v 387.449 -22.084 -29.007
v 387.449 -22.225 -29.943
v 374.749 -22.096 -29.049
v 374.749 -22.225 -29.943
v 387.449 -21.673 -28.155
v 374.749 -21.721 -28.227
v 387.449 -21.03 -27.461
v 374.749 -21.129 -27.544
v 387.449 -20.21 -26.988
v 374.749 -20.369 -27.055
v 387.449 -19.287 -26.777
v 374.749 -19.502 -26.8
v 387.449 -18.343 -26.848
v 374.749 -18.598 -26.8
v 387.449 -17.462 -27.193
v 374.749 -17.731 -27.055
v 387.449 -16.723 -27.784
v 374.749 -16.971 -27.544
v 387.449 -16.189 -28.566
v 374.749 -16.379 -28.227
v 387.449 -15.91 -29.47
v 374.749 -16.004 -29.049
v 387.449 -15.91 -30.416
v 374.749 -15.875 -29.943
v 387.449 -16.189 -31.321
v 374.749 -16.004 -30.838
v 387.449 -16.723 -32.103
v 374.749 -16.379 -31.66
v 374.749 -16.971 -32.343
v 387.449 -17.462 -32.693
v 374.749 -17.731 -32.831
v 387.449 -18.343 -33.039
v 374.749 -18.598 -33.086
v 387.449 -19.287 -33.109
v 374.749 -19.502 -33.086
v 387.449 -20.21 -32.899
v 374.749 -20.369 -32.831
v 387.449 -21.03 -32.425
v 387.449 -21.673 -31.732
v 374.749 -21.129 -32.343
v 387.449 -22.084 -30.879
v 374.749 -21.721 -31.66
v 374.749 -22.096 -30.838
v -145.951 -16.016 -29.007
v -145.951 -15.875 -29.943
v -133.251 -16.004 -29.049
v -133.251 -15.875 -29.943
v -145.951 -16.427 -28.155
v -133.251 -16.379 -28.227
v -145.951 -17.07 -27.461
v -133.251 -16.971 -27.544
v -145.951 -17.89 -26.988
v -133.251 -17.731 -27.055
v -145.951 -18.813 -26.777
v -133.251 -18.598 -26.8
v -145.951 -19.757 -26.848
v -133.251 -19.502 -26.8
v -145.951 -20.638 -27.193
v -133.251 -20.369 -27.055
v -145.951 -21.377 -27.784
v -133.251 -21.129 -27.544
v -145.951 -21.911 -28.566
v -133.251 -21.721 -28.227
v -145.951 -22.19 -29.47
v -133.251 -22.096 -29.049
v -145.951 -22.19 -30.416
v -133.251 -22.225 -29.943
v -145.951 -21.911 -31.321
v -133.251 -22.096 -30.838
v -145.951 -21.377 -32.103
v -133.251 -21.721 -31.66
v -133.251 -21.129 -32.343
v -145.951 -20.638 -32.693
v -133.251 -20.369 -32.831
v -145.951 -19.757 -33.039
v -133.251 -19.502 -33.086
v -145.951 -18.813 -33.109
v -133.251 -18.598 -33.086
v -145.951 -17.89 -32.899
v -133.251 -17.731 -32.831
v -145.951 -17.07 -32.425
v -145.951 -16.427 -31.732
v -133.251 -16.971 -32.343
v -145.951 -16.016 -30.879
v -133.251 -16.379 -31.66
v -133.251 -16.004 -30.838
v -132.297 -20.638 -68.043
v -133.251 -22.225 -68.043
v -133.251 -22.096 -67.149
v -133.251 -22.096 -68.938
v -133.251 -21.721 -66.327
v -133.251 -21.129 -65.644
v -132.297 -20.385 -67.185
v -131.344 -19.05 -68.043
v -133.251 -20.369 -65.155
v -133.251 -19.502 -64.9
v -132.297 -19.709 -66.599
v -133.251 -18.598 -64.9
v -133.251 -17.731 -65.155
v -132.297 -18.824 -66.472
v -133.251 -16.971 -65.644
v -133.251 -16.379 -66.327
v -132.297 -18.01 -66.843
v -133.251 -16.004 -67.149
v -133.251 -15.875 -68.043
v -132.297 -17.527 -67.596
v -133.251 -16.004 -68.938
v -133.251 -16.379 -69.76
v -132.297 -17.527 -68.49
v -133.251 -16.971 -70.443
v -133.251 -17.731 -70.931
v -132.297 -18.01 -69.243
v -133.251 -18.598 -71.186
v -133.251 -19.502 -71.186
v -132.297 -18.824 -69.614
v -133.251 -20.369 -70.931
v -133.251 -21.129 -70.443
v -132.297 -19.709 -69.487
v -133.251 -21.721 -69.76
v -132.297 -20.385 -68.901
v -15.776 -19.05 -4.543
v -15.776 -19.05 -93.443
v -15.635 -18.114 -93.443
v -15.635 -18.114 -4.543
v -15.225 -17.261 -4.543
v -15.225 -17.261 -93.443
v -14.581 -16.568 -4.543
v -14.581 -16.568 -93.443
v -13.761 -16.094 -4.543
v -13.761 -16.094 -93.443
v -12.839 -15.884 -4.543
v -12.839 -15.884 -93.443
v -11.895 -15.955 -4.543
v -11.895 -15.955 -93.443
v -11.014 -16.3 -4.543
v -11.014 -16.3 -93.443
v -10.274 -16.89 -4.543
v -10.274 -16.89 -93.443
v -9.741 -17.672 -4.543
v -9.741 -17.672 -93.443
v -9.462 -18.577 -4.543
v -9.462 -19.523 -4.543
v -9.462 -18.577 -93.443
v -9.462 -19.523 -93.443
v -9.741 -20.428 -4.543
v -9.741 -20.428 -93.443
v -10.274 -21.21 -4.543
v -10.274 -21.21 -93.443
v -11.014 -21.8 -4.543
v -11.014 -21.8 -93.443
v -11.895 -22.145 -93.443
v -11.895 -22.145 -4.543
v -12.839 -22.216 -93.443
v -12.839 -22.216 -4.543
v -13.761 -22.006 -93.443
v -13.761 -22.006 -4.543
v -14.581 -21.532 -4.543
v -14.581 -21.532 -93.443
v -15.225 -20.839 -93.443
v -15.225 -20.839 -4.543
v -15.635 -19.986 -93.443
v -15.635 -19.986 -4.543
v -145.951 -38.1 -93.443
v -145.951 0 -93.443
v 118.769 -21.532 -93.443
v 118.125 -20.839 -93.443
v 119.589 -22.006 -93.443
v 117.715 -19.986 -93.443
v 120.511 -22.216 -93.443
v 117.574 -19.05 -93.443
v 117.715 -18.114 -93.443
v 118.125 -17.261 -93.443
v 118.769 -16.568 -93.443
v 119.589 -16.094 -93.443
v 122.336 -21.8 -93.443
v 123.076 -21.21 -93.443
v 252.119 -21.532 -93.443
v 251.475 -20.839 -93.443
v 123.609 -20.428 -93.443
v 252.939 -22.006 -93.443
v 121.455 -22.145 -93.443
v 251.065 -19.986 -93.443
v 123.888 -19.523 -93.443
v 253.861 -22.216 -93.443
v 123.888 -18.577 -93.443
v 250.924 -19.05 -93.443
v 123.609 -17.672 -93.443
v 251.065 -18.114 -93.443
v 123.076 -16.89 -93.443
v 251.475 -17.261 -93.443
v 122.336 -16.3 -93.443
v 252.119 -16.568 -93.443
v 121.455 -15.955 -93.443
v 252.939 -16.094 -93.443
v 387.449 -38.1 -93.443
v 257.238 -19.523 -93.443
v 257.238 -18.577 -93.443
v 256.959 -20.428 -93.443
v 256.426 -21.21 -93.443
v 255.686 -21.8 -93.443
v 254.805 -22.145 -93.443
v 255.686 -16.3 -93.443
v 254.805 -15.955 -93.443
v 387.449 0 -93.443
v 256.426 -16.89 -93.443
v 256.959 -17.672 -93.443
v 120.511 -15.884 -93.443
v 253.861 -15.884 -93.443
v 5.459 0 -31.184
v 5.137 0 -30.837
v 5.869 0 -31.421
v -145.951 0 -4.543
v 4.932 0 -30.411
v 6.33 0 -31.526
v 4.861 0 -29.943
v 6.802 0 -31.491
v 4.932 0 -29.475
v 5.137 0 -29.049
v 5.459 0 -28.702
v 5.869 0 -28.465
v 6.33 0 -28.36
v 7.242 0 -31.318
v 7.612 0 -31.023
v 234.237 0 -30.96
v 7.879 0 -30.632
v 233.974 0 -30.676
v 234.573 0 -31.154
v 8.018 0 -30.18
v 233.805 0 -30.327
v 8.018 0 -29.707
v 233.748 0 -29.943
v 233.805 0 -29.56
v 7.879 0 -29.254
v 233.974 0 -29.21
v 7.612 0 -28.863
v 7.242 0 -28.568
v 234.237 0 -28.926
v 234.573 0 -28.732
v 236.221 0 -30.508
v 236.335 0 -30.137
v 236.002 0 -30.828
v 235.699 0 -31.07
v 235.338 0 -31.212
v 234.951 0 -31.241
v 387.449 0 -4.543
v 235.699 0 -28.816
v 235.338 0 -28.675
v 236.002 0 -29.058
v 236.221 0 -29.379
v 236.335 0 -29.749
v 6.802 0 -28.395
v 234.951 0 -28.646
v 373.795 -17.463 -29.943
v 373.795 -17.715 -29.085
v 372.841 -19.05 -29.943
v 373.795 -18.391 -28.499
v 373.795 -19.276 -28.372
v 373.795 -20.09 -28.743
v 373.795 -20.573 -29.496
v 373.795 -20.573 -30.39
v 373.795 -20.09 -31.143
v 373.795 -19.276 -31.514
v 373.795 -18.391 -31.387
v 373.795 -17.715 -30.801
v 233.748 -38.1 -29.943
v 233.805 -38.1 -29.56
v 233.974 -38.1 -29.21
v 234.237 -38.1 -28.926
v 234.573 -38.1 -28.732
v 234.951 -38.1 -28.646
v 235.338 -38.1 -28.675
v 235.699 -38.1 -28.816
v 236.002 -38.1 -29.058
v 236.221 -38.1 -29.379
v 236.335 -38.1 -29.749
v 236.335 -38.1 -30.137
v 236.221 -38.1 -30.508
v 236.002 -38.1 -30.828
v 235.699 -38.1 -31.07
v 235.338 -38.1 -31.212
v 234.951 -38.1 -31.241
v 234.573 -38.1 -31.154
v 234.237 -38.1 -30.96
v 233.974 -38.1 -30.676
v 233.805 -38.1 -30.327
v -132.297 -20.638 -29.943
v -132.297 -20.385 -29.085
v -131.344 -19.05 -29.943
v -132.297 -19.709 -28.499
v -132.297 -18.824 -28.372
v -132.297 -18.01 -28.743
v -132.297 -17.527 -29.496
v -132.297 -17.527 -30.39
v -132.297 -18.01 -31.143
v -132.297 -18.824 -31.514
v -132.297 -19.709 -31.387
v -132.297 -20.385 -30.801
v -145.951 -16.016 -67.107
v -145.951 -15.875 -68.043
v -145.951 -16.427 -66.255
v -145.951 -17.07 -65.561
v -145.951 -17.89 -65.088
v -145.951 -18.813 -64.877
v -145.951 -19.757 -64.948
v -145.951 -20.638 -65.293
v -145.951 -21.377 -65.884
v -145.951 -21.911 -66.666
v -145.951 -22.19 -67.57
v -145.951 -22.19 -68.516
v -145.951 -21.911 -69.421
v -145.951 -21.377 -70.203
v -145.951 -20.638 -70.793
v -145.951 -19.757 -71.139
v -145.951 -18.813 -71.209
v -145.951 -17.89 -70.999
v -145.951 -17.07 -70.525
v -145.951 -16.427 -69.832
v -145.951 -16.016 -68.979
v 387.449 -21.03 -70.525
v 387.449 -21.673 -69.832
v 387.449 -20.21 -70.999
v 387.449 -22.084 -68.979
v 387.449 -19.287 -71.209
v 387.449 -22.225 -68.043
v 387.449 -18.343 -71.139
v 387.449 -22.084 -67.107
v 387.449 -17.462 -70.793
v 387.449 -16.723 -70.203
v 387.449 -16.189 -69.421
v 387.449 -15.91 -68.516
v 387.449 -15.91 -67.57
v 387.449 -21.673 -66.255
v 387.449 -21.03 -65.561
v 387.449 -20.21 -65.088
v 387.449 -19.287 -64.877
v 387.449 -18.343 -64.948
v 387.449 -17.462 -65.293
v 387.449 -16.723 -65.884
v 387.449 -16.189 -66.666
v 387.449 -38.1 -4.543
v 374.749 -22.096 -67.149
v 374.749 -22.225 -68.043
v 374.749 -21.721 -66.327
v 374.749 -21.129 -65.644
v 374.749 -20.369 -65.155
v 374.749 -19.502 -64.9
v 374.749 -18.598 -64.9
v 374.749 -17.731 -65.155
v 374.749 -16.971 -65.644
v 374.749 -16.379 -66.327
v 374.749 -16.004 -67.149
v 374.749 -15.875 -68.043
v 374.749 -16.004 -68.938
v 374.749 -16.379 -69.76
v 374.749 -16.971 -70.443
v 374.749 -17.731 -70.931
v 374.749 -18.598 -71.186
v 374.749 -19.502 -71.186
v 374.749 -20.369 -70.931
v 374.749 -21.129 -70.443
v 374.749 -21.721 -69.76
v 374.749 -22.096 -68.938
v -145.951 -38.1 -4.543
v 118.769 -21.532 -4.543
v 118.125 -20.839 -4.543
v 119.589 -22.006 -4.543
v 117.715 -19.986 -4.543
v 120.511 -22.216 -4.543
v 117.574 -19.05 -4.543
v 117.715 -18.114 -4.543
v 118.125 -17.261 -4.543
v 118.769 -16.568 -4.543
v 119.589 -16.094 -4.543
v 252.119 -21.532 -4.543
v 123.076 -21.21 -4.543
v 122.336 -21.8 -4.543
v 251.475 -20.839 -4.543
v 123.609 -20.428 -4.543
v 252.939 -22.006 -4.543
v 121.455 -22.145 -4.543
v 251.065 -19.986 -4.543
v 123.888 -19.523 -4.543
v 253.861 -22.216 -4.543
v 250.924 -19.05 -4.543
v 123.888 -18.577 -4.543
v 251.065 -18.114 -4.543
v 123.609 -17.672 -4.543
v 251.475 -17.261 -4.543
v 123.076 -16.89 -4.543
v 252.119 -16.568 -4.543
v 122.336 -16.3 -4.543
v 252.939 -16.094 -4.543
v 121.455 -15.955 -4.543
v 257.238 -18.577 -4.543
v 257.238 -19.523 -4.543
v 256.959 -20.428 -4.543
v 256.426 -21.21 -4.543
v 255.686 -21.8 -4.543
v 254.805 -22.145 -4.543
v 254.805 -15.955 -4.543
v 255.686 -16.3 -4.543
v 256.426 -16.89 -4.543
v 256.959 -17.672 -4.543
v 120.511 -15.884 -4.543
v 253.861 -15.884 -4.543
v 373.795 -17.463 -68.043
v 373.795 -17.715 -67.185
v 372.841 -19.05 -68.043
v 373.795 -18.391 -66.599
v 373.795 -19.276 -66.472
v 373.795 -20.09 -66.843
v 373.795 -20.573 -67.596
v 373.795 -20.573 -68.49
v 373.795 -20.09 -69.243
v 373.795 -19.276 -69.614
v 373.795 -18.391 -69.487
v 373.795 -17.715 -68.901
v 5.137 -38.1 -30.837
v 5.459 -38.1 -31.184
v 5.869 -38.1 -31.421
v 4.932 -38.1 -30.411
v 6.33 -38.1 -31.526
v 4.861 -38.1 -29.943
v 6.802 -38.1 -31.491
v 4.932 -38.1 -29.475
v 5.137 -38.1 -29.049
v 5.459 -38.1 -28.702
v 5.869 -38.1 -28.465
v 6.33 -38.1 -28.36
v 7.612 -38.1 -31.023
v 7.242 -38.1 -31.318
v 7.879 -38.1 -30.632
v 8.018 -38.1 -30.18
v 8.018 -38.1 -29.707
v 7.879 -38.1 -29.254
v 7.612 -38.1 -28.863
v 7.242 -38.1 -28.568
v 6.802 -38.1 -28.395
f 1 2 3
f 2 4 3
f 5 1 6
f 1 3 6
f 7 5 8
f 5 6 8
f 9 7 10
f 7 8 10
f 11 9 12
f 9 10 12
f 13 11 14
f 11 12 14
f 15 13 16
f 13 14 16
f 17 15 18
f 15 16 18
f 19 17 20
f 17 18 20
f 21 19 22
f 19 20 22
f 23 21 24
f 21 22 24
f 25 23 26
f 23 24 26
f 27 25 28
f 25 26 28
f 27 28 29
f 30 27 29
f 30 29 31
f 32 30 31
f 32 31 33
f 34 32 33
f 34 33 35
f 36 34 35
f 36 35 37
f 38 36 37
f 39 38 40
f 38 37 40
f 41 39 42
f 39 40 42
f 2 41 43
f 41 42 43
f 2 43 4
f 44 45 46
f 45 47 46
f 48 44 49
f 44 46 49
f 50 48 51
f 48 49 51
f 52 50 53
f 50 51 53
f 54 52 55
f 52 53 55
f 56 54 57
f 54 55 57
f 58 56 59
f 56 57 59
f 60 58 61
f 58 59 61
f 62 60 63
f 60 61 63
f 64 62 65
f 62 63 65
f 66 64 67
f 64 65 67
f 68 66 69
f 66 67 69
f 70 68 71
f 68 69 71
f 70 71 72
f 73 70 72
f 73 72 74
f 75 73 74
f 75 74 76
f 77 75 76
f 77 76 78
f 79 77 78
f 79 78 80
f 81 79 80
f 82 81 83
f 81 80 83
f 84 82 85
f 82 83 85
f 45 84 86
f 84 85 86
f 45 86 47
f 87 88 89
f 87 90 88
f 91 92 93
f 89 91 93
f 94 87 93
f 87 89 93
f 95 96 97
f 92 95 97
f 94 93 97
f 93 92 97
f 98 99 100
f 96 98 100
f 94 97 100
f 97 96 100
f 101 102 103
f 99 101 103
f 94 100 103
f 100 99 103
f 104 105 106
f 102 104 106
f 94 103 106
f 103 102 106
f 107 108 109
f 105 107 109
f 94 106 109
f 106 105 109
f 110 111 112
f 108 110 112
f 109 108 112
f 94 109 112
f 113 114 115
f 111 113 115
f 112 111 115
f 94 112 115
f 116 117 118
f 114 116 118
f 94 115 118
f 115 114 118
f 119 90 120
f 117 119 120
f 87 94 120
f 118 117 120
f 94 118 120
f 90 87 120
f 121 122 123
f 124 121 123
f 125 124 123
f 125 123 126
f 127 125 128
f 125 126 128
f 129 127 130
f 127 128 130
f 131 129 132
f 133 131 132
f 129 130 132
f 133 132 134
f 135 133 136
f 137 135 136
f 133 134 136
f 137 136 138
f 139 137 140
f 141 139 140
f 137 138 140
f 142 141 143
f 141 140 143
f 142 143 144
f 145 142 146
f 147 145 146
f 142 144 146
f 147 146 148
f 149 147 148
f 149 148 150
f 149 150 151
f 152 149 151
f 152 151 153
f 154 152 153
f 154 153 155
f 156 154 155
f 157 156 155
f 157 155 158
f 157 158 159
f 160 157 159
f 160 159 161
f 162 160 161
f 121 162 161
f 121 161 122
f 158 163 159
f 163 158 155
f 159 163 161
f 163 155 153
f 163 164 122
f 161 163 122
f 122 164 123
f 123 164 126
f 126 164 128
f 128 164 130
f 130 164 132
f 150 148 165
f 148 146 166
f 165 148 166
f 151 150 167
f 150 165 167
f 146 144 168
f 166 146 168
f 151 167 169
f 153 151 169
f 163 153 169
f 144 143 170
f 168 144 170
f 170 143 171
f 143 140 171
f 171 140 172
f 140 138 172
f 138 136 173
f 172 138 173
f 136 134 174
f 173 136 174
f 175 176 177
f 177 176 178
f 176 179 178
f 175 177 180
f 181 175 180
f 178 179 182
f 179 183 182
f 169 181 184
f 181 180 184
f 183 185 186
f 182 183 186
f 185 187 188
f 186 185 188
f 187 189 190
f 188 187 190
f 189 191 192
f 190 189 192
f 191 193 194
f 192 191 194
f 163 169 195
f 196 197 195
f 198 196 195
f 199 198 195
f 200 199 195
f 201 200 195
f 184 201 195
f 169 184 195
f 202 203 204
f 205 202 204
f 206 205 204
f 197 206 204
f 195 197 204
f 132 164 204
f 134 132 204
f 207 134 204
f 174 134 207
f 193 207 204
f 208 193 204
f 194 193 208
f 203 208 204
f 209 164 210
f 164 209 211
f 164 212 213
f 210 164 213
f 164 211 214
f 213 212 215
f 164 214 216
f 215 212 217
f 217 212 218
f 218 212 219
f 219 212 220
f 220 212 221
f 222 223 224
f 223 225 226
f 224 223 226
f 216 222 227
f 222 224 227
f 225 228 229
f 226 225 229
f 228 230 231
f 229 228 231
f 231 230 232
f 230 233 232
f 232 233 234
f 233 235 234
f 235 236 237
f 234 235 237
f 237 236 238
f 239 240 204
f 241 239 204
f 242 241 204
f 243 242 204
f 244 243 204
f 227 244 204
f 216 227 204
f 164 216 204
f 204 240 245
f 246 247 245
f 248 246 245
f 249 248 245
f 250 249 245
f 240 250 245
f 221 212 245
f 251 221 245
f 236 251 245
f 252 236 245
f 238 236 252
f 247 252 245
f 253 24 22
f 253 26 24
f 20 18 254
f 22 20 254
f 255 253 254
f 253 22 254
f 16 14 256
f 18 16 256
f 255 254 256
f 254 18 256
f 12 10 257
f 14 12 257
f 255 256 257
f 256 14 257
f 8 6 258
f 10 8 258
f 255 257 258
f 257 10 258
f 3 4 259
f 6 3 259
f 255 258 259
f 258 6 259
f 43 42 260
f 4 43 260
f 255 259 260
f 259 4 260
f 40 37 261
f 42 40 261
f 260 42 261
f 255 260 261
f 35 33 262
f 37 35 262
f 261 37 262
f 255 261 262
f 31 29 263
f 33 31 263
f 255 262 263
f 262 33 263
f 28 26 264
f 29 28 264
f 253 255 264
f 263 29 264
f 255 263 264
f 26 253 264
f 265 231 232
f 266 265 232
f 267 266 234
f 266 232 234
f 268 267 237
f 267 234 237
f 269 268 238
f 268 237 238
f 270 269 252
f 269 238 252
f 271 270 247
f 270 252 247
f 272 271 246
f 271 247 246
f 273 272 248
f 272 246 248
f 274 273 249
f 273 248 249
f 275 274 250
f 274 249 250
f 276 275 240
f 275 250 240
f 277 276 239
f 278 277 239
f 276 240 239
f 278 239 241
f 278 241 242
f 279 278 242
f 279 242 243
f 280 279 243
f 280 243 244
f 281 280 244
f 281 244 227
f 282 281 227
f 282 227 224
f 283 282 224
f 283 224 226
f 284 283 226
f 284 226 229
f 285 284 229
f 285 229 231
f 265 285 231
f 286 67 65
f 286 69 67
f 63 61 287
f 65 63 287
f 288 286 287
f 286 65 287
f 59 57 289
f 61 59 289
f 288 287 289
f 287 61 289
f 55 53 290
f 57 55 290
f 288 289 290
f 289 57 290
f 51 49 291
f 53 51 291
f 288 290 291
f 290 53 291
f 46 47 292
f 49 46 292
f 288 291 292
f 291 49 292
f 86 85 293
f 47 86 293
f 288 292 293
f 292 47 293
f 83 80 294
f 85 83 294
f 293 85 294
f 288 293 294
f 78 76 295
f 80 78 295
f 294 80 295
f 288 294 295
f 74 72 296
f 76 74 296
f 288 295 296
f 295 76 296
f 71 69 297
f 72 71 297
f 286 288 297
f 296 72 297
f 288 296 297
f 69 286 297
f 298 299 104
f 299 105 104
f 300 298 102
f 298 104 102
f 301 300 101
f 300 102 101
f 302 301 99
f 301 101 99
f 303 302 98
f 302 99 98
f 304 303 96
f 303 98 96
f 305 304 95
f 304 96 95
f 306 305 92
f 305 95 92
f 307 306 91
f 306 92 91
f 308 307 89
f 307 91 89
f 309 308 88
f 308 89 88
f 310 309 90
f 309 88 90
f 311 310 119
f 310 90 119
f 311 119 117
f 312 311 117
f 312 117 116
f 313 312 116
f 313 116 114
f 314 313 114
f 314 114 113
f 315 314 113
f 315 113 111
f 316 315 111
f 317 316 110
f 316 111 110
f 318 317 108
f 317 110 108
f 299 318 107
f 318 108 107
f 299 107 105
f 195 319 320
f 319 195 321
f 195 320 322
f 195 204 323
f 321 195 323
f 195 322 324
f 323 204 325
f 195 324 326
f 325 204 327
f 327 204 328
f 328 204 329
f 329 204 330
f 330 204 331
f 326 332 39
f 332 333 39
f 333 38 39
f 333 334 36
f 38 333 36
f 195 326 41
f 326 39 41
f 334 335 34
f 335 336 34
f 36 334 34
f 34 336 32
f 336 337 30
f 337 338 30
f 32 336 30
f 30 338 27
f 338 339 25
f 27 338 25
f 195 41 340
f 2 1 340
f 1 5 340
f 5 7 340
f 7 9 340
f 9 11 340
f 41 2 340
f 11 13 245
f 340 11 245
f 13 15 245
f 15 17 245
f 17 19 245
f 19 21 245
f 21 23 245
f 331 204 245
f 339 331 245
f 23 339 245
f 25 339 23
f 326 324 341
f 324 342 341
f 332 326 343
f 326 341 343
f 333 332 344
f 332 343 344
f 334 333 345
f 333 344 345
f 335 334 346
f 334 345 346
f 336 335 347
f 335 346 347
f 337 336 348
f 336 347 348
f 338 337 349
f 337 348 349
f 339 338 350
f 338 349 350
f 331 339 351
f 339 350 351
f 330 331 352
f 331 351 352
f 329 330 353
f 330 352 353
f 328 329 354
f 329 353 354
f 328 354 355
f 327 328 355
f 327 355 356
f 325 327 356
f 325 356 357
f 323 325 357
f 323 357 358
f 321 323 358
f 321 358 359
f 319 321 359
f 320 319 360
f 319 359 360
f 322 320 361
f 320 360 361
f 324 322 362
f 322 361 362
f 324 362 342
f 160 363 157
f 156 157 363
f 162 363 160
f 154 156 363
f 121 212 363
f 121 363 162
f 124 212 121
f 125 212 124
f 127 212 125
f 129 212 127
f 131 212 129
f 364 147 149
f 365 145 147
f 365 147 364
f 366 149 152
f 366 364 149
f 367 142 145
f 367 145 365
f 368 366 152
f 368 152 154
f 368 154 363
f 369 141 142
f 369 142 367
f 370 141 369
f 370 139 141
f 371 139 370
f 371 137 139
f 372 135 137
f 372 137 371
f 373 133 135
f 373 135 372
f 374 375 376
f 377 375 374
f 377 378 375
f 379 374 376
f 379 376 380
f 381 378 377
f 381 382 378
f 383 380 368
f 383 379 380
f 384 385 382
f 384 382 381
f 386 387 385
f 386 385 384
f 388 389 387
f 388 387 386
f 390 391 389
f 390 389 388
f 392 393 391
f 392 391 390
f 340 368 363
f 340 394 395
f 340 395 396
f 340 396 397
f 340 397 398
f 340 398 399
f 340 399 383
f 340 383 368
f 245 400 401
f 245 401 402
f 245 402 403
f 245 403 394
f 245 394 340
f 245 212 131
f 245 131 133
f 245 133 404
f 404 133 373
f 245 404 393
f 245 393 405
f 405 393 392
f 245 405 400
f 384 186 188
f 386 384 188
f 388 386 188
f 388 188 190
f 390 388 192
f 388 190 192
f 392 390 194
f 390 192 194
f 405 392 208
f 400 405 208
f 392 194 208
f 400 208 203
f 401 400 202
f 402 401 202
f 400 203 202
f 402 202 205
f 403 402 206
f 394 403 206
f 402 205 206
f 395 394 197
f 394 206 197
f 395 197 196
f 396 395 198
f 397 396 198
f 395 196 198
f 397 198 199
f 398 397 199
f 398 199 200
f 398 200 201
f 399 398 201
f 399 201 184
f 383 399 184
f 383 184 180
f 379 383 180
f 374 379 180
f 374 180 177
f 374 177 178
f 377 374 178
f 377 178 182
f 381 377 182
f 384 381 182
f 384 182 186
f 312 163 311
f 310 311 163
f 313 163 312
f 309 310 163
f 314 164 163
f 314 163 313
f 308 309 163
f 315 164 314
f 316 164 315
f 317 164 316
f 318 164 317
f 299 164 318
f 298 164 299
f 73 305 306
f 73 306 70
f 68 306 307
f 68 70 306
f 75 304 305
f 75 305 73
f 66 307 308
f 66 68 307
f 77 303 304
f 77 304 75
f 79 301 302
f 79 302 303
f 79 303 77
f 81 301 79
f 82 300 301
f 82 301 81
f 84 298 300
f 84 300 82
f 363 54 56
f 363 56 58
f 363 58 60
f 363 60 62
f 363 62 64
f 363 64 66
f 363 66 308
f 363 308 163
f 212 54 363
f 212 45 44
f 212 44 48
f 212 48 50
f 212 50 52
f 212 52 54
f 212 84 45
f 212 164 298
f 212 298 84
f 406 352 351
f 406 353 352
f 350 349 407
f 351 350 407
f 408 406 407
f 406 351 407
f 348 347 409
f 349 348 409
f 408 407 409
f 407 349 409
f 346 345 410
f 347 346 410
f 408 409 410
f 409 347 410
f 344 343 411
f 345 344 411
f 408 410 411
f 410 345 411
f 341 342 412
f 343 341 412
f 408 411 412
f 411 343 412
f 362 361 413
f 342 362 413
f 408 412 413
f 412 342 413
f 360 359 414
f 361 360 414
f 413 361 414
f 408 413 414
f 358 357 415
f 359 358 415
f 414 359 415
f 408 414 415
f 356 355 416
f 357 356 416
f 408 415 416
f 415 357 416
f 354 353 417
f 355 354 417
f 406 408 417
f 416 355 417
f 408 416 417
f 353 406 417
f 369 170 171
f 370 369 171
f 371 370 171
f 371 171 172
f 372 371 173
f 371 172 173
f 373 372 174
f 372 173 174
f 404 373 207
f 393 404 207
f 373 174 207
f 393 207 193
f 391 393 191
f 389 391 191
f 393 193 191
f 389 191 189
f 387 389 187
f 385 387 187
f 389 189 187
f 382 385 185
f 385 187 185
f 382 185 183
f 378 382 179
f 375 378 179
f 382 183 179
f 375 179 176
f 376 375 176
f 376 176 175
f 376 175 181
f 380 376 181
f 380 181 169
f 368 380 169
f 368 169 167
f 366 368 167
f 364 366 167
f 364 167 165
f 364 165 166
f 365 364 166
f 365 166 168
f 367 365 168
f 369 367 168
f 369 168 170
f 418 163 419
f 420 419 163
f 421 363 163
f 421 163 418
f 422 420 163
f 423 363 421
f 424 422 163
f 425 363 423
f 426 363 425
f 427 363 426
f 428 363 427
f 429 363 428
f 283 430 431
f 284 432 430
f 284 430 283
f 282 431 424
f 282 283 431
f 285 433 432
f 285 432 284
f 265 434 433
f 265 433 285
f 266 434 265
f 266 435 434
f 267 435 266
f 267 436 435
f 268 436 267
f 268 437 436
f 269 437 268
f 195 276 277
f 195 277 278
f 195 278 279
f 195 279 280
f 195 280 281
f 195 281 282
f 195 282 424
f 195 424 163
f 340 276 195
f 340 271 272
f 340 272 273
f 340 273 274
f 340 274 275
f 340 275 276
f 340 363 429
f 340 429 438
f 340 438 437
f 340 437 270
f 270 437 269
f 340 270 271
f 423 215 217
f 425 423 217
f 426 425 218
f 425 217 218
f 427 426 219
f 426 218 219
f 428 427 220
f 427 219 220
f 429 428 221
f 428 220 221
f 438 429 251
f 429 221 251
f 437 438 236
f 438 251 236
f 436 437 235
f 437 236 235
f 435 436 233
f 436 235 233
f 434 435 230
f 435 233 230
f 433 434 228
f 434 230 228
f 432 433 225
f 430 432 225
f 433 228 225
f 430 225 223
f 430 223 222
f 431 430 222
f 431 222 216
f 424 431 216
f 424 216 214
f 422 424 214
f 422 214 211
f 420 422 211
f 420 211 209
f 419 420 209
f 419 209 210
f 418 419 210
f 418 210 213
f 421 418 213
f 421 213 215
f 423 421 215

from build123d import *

# Parameters (mm, degrees)
F0_W     = 533.4
F0_H     = 88.9
F1_DEPTH = 38.1
F3_D     = 6.35
F3_DEPTH = 12.7
F3_TIP   = 1.9077324654
F5_D     = 6.35
F5_DEPTH = 12.7
F5_TIP   = 1.9077324654
F7_D     = 6.35
F8_R     = 1.3011245906
F8_R_2   = 1.5875
F9_DEPTH = 38.101


with BuildPart() as f1:
    # F0 (on Front) → F1 (new body)
    with BuildSketch(Plane.XZ):
        with Locations((120.748703318, -48.9931209013)):
            Rectangle(F0_W, F0_H)
    extrude(amount=F1_DEPTH)

    # F3
    with Locations(Plane.YZ.offset(387.448703318)):
        with Locations((-19.05, -29.9431209013), (-19.05, -68.0431209013)):
            Hole(F3_D / 2, depth=F3_DEPTH)
            with Locations((0, 0, -(F3_DEPTH + F3_TIP / 2))):  # 118° drill point
                Cone(0, F3_D / 2, F3_TIP, mode=Mode.SUBTRACT)

    # F5
    with Locations(Plane(origin=(-145.951296682, 0, 0), x_dir=(0, -1, 0), z_dir=(-1, 0, 0))):
        with Locations((19.05, -29.9431209013), (19.05, -68.0431209013)):
            Hole(F5_D / 2, depth=F5_DEPTH)
            with Locations((0, 0, -(F5_DEPTH + F5_TIP / 2))):  # 118° drill point
                Cone(0, F5_D / 2, F5_TIP, mode=Mode.SUBTRACT)

    # F7 (through all)
    with Locations(Plane.XY.offset(-4.5431209013)):
        with Locations((-12.601296682, -19.05), (120.748703318, -19.05), (254.098703318, -19.05)):
            Hole(F7_D / 2)

    # F8 (on face) → F9 (cut, through all)
    with BuildSketch(Plane(origin=(0, 0, 0), x_dir=(-1, 0, 0), z_dir=(0, 1, 0))):
        with Locations((-235.048703318, -29.9431209013)):
            Circle(F8_R)
        with Locations((-6.448703318, -29.9431209013)):
            Circle(F8_R_2)
    extrude(amount=-F9_DEPTH, mode=Mode.SUBTRACT)


solid = f1.part
